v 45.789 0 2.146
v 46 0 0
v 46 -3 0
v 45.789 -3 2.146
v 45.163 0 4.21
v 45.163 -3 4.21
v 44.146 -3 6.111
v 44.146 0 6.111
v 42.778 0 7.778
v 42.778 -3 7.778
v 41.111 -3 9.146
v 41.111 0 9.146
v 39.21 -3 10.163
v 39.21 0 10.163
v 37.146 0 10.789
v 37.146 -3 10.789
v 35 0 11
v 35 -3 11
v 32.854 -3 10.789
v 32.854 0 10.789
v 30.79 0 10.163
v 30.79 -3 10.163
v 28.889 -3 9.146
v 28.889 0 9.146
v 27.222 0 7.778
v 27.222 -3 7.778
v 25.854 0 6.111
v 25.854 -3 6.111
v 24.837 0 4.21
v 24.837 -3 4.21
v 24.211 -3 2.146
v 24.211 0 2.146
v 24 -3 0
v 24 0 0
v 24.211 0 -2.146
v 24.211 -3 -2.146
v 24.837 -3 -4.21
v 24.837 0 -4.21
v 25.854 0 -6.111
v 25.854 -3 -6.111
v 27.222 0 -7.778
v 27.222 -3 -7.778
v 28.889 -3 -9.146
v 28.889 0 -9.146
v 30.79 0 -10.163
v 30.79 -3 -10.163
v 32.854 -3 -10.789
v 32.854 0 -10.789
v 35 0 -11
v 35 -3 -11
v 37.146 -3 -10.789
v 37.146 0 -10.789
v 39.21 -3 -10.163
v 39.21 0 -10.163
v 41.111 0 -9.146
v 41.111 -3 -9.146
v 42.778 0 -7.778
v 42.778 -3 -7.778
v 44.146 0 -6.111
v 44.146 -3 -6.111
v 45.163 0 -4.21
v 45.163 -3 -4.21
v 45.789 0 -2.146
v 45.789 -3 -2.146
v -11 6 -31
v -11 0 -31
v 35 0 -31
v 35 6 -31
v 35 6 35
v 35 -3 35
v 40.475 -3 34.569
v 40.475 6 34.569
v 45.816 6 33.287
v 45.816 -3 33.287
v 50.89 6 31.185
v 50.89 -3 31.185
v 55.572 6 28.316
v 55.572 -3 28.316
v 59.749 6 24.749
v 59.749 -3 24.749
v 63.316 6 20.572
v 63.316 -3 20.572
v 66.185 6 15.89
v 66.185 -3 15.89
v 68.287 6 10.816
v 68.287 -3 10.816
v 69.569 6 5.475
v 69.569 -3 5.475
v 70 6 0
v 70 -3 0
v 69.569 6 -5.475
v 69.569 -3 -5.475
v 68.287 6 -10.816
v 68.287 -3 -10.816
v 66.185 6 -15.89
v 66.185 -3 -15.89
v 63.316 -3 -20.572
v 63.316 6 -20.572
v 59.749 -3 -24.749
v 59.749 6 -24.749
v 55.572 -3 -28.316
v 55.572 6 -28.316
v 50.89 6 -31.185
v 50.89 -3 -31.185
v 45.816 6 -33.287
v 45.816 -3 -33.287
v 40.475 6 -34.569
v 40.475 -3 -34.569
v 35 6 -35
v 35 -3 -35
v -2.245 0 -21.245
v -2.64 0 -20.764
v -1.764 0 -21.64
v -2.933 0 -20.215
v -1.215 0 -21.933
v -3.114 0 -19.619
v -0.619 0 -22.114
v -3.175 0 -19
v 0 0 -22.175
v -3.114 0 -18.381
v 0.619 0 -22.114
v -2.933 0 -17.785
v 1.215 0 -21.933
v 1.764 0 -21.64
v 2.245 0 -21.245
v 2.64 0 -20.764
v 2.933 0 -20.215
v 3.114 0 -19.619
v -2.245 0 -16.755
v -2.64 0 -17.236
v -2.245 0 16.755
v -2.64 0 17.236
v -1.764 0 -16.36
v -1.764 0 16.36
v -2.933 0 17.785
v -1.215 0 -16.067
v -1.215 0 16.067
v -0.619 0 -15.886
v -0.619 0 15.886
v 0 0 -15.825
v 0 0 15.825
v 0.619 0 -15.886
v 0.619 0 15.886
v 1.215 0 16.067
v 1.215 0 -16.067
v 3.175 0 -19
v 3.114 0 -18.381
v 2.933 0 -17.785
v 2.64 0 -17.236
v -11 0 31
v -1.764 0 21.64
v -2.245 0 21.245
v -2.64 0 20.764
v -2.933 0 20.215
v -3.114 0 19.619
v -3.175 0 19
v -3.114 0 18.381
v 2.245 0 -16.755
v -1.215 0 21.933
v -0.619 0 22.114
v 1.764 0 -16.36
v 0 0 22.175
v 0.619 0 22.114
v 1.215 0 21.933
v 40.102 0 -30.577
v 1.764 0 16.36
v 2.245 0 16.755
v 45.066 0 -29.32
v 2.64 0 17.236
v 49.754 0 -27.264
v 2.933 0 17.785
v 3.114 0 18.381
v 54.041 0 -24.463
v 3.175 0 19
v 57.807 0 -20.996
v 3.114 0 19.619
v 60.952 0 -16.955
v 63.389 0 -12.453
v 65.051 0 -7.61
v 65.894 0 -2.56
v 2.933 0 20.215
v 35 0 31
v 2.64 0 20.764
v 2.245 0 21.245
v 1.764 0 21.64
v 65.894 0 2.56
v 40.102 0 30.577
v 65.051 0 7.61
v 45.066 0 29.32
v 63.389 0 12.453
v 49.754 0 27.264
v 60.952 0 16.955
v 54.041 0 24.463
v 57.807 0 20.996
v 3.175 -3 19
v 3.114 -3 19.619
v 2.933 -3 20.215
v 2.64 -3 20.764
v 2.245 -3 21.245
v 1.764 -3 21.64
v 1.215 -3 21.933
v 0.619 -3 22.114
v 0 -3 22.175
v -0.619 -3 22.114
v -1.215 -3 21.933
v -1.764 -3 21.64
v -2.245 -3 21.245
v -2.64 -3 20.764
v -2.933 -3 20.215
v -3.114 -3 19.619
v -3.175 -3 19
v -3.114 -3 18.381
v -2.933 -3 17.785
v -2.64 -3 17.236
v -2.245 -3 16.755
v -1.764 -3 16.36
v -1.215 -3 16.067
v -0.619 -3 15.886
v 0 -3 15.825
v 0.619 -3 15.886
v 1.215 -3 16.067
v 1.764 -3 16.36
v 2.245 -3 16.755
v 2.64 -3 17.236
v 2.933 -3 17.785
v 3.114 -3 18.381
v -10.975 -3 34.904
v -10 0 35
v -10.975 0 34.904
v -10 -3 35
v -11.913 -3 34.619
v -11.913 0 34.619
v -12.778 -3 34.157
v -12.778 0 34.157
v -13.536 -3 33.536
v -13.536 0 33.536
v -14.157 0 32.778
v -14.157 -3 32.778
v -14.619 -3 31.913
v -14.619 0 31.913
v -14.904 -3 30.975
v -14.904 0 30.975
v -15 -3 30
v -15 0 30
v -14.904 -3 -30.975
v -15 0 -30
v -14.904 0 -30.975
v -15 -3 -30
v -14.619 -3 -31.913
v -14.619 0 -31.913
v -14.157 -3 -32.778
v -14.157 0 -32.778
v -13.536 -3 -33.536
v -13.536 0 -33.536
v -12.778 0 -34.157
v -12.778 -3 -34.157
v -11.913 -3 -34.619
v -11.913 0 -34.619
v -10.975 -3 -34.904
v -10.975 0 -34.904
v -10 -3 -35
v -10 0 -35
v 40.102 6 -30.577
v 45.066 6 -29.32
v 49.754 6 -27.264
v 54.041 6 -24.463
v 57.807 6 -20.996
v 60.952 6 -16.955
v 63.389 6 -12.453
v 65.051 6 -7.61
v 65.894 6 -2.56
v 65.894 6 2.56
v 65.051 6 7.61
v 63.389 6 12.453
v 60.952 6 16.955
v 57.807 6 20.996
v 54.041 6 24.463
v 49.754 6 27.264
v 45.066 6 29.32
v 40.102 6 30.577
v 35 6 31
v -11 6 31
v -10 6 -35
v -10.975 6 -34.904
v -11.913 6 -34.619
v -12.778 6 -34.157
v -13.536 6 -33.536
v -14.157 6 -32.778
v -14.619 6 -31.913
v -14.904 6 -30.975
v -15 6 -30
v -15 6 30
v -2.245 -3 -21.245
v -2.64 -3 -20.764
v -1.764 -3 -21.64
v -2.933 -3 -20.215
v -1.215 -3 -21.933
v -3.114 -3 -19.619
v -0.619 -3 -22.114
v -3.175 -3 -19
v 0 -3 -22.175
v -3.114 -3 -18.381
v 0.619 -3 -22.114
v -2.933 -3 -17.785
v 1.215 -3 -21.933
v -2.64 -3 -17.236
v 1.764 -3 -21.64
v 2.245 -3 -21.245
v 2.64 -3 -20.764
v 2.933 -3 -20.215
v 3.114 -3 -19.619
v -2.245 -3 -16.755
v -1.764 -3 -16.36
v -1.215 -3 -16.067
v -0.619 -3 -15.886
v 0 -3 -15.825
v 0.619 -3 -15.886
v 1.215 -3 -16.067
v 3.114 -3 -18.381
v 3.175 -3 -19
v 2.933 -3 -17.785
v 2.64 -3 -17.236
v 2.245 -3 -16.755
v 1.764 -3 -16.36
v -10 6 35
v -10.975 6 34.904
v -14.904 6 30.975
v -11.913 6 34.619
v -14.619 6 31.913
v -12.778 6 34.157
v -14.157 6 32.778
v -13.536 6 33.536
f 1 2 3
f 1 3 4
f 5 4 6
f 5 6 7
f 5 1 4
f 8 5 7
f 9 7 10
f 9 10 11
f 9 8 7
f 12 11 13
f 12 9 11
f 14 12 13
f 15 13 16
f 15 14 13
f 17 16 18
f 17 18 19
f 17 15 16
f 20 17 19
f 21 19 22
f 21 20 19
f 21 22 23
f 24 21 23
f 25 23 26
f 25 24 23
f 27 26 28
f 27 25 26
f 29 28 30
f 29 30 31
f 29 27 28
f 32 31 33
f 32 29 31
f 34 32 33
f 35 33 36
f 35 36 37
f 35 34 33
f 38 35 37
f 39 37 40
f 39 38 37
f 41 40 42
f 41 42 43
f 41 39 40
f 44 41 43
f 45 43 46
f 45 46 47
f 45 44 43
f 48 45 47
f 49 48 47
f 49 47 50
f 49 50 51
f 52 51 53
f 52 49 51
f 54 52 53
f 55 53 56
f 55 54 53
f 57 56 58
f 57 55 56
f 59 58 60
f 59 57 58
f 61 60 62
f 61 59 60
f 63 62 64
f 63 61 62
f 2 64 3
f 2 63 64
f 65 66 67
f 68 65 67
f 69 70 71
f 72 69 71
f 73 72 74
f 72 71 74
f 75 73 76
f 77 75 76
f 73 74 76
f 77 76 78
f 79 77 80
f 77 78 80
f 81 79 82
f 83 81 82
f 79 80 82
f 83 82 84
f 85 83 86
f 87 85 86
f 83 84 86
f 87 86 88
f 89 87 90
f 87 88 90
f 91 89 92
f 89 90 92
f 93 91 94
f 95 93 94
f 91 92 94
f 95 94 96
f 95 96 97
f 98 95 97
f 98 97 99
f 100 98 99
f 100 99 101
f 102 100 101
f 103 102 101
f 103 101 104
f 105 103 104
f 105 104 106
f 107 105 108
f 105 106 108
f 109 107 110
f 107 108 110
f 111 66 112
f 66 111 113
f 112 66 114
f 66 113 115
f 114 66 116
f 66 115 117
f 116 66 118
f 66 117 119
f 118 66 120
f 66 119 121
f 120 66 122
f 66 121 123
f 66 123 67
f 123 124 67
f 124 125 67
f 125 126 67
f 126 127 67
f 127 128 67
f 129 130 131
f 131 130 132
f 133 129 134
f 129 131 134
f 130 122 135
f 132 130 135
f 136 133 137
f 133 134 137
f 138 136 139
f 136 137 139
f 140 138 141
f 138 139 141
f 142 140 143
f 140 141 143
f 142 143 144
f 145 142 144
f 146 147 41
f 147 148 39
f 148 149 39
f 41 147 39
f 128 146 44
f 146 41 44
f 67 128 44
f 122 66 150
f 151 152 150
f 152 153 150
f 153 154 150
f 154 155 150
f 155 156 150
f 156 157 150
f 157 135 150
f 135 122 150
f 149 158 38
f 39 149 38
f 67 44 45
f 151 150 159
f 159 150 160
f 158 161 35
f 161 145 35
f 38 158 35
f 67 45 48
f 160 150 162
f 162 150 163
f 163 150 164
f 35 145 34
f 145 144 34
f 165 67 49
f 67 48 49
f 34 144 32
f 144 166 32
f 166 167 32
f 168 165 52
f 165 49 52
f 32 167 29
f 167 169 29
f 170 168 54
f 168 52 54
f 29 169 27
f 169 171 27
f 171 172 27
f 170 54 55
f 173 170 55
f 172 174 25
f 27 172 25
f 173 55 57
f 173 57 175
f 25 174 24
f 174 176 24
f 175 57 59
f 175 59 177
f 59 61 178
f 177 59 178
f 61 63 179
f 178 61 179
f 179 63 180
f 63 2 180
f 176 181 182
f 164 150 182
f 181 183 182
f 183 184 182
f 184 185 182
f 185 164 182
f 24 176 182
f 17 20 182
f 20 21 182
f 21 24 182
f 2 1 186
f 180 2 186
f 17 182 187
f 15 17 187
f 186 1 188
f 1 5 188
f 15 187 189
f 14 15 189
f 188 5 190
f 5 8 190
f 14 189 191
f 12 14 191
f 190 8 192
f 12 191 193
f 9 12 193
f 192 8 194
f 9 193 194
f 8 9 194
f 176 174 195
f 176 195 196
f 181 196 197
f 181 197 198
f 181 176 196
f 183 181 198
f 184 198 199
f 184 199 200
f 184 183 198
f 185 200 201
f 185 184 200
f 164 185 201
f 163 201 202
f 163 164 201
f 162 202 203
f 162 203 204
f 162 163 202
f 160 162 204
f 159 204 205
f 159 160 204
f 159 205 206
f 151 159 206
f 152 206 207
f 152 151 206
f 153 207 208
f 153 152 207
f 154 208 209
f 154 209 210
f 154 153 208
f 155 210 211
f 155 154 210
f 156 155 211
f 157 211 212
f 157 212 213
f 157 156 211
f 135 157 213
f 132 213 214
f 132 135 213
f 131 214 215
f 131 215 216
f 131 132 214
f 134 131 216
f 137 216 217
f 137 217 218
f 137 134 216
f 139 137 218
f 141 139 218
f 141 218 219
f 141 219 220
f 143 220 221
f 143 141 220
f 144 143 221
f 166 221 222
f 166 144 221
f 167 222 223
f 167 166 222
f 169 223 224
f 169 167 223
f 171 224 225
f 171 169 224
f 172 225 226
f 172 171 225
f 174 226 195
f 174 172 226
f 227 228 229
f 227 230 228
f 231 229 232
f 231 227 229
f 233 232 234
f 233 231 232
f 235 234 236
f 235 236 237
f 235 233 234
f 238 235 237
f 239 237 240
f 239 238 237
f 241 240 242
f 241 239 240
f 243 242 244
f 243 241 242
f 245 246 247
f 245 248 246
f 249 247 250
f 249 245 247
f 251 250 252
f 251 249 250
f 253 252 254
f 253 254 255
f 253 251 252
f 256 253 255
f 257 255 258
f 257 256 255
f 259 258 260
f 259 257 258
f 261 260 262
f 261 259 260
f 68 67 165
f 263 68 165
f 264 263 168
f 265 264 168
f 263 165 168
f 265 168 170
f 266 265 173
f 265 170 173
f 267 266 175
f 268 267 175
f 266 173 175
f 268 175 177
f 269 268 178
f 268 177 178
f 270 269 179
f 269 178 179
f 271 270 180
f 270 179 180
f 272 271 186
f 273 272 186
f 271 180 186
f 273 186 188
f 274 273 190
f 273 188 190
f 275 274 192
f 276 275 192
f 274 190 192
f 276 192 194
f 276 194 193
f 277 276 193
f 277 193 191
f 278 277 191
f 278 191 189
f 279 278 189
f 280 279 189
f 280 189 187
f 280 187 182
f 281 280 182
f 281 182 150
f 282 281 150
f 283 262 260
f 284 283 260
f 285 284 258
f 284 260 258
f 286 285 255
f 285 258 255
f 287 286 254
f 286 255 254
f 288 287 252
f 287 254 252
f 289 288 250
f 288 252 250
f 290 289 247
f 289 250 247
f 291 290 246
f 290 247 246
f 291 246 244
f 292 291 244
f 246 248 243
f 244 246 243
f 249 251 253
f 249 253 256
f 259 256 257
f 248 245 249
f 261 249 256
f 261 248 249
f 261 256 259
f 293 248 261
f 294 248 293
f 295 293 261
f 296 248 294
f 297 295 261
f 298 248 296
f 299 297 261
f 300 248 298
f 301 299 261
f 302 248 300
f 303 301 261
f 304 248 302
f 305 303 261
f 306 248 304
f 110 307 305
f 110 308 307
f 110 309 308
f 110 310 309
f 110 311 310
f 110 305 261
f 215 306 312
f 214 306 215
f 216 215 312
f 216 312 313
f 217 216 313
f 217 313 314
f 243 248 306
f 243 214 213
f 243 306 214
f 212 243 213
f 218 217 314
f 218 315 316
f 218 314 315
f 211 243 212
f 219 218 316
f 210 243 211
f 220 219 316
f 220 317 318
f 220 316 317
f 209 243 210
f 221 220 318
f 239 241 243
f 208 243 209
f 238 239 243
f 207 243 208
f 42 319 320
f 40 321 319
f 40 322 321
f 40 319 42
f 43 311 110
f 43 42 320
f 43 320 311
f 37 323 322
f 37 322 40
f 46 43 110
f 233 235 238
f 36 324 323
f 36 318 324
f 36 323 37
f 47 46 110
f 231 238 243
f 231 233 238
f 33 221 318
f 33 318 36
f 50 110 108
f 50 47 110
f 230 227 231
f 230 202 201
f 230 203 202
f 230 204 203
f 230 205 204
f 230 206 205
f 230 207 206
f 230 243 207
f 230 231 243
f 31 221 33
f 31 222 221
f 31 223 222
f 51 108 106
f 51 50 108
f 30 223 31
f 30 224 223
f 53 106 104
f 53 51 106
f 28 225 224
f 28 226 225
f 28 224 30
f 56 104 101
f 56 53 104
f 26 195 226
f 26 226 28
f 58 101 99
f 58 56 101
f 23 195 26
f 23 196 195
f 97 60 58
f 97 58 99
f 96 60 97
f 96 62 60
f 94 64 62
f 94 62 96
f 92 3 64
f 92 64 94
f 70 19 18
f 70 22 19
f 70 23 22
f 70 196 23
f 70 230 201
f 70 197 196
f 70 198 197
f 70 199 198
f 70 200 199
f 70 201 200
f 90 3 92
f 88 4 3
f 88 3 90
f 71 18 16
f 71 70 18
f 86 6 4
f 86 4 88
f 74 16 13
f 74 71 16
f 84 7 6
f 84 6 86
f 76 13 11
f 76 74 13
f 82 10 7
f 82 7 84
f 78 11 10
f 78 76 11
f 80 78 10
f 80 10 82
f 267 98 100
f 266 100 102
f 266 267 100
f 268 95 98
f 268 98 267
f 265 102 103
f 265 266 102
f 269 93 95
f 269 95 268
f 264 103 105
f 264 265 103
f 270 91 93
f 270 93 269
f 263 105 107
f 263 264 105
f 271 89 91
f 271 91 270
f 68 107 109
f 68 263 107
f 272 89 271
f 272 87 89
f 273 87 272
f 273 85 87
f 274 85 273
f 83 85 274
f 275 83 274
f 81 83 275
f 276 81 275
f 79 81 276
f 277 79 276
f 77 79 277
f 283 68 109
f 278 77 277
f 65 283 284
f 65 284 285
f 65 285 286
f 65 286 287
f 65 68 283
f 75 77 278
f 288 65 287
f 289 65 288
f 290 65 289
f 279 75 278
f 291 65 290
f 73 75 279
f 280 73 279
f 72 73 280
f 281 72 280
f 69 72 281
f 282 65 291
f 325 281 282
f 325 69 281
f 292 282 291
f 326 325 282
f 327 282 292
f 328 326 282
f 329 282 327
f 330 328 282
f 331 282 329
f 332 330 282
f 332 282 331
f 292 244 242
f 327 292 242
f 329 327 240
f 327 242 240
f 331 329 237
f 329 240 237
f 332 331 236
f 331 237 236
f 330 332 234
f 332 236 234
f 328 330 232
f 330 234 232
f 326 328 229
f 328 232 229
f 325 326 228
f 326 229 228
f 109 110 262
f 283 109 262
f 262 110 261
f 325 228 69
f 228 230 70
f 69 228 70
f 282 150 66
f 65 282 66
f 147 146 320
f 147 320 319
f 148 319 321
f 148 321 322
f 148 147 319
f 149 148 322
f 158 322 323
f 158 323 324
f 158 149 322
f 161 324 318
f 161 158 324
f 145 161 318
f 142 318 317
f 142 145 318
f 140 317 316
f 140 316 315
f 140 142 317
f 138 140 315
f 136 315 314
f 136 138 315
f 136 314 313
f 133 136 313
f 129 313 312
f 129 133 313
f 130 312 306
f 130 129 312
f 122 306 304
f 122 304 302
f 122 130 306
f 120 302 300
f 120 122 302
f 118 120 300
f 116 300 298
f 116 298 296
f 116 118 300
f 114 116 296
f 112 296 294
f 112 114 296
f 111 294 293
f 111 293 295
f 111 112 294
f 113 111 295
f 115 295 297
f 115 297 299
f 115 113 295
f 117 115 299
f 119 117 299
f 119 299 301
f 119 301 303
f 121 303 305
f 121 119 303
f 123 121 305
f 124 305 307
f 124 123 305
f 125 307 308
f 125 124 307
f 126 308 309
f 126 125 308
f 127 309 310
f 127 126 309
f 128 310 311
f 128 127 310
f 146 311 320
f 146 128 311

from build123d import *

# Parameters (mm, degrees)
F0_R     = 3.175
F0_R_2   = 11
F1_DEPTH = 3
F3_R     = 5
F5_DEPTH = 6


with BuildPart() as f1:
    # F0 (on Front) → F1 (new body)
    with BuildSketch(Plane.XZ):
        with BuildLine():
            Line((35, 35), (-15, 35))
            Line((-15, 35), (-15, -35))
            Line((-15, -35), (35, -35))
            ThreePointArc((35, -35), (70, 0), (35, 35))
        make_face()
        with Locations((0, -19)):
            Circle(F0_R, mode=Mode.SUBTRACT)
        with Locations((0, 19)):
            Circle(F0_R, mode=Mode.SUBTRACT)
        with Locations((35, 0)):
            Circle(F0_R_2, mode=Mode.SUBTRACT)
    extrude(amount=F1_DEPTH)

    # F2: F1 across plane


with BuildPart() as f1_1:
    add(f1.part)
    add(f1.part.mirror(Plane.XY))

    # F3
    f3_edges = [f1_1.edges().sort_by_distance(p)[0] for p in [
        (-15, -1.5, -35),
        (-15, -1.5, 35),
    ]]
    fillet(f3_edges, radius=F3_R)

    # F4 (on face) → F5 (join)
    with BuildSketch(Plane(origin=(0, 0, 0), x_dir=(-1, 0, 0), z_dir=(0, 1, 0))):
        with BuildLine():
            Line((-35, -35), (10, -35))
            ThreePointArc((10, -35), (13.5355339059, -33.5355339059), (15, -30))
            Line((15, -30), (15, 30))
            ThreePointArc((15, 30), (13.5355339059, 33.5355339059), (10, 35))
            Line((10, 35), (-35, 35))
            ThreePointArc((-35, 35), (-70, 0), (-35, -35))
        make_face()
        with BuildLine():
            Line((-35, 31), (11, 31))
            Line((11, 31), (11, -31))
            Line((11, -31), (-35, -31))
            ThreePointArc((-35, -31), (-66, 0), (-35, 31))
        make_face(mode=Mode.SUBTRACT)
    extrude(amount=F5_DEPTH)


solid = f1_1.part
